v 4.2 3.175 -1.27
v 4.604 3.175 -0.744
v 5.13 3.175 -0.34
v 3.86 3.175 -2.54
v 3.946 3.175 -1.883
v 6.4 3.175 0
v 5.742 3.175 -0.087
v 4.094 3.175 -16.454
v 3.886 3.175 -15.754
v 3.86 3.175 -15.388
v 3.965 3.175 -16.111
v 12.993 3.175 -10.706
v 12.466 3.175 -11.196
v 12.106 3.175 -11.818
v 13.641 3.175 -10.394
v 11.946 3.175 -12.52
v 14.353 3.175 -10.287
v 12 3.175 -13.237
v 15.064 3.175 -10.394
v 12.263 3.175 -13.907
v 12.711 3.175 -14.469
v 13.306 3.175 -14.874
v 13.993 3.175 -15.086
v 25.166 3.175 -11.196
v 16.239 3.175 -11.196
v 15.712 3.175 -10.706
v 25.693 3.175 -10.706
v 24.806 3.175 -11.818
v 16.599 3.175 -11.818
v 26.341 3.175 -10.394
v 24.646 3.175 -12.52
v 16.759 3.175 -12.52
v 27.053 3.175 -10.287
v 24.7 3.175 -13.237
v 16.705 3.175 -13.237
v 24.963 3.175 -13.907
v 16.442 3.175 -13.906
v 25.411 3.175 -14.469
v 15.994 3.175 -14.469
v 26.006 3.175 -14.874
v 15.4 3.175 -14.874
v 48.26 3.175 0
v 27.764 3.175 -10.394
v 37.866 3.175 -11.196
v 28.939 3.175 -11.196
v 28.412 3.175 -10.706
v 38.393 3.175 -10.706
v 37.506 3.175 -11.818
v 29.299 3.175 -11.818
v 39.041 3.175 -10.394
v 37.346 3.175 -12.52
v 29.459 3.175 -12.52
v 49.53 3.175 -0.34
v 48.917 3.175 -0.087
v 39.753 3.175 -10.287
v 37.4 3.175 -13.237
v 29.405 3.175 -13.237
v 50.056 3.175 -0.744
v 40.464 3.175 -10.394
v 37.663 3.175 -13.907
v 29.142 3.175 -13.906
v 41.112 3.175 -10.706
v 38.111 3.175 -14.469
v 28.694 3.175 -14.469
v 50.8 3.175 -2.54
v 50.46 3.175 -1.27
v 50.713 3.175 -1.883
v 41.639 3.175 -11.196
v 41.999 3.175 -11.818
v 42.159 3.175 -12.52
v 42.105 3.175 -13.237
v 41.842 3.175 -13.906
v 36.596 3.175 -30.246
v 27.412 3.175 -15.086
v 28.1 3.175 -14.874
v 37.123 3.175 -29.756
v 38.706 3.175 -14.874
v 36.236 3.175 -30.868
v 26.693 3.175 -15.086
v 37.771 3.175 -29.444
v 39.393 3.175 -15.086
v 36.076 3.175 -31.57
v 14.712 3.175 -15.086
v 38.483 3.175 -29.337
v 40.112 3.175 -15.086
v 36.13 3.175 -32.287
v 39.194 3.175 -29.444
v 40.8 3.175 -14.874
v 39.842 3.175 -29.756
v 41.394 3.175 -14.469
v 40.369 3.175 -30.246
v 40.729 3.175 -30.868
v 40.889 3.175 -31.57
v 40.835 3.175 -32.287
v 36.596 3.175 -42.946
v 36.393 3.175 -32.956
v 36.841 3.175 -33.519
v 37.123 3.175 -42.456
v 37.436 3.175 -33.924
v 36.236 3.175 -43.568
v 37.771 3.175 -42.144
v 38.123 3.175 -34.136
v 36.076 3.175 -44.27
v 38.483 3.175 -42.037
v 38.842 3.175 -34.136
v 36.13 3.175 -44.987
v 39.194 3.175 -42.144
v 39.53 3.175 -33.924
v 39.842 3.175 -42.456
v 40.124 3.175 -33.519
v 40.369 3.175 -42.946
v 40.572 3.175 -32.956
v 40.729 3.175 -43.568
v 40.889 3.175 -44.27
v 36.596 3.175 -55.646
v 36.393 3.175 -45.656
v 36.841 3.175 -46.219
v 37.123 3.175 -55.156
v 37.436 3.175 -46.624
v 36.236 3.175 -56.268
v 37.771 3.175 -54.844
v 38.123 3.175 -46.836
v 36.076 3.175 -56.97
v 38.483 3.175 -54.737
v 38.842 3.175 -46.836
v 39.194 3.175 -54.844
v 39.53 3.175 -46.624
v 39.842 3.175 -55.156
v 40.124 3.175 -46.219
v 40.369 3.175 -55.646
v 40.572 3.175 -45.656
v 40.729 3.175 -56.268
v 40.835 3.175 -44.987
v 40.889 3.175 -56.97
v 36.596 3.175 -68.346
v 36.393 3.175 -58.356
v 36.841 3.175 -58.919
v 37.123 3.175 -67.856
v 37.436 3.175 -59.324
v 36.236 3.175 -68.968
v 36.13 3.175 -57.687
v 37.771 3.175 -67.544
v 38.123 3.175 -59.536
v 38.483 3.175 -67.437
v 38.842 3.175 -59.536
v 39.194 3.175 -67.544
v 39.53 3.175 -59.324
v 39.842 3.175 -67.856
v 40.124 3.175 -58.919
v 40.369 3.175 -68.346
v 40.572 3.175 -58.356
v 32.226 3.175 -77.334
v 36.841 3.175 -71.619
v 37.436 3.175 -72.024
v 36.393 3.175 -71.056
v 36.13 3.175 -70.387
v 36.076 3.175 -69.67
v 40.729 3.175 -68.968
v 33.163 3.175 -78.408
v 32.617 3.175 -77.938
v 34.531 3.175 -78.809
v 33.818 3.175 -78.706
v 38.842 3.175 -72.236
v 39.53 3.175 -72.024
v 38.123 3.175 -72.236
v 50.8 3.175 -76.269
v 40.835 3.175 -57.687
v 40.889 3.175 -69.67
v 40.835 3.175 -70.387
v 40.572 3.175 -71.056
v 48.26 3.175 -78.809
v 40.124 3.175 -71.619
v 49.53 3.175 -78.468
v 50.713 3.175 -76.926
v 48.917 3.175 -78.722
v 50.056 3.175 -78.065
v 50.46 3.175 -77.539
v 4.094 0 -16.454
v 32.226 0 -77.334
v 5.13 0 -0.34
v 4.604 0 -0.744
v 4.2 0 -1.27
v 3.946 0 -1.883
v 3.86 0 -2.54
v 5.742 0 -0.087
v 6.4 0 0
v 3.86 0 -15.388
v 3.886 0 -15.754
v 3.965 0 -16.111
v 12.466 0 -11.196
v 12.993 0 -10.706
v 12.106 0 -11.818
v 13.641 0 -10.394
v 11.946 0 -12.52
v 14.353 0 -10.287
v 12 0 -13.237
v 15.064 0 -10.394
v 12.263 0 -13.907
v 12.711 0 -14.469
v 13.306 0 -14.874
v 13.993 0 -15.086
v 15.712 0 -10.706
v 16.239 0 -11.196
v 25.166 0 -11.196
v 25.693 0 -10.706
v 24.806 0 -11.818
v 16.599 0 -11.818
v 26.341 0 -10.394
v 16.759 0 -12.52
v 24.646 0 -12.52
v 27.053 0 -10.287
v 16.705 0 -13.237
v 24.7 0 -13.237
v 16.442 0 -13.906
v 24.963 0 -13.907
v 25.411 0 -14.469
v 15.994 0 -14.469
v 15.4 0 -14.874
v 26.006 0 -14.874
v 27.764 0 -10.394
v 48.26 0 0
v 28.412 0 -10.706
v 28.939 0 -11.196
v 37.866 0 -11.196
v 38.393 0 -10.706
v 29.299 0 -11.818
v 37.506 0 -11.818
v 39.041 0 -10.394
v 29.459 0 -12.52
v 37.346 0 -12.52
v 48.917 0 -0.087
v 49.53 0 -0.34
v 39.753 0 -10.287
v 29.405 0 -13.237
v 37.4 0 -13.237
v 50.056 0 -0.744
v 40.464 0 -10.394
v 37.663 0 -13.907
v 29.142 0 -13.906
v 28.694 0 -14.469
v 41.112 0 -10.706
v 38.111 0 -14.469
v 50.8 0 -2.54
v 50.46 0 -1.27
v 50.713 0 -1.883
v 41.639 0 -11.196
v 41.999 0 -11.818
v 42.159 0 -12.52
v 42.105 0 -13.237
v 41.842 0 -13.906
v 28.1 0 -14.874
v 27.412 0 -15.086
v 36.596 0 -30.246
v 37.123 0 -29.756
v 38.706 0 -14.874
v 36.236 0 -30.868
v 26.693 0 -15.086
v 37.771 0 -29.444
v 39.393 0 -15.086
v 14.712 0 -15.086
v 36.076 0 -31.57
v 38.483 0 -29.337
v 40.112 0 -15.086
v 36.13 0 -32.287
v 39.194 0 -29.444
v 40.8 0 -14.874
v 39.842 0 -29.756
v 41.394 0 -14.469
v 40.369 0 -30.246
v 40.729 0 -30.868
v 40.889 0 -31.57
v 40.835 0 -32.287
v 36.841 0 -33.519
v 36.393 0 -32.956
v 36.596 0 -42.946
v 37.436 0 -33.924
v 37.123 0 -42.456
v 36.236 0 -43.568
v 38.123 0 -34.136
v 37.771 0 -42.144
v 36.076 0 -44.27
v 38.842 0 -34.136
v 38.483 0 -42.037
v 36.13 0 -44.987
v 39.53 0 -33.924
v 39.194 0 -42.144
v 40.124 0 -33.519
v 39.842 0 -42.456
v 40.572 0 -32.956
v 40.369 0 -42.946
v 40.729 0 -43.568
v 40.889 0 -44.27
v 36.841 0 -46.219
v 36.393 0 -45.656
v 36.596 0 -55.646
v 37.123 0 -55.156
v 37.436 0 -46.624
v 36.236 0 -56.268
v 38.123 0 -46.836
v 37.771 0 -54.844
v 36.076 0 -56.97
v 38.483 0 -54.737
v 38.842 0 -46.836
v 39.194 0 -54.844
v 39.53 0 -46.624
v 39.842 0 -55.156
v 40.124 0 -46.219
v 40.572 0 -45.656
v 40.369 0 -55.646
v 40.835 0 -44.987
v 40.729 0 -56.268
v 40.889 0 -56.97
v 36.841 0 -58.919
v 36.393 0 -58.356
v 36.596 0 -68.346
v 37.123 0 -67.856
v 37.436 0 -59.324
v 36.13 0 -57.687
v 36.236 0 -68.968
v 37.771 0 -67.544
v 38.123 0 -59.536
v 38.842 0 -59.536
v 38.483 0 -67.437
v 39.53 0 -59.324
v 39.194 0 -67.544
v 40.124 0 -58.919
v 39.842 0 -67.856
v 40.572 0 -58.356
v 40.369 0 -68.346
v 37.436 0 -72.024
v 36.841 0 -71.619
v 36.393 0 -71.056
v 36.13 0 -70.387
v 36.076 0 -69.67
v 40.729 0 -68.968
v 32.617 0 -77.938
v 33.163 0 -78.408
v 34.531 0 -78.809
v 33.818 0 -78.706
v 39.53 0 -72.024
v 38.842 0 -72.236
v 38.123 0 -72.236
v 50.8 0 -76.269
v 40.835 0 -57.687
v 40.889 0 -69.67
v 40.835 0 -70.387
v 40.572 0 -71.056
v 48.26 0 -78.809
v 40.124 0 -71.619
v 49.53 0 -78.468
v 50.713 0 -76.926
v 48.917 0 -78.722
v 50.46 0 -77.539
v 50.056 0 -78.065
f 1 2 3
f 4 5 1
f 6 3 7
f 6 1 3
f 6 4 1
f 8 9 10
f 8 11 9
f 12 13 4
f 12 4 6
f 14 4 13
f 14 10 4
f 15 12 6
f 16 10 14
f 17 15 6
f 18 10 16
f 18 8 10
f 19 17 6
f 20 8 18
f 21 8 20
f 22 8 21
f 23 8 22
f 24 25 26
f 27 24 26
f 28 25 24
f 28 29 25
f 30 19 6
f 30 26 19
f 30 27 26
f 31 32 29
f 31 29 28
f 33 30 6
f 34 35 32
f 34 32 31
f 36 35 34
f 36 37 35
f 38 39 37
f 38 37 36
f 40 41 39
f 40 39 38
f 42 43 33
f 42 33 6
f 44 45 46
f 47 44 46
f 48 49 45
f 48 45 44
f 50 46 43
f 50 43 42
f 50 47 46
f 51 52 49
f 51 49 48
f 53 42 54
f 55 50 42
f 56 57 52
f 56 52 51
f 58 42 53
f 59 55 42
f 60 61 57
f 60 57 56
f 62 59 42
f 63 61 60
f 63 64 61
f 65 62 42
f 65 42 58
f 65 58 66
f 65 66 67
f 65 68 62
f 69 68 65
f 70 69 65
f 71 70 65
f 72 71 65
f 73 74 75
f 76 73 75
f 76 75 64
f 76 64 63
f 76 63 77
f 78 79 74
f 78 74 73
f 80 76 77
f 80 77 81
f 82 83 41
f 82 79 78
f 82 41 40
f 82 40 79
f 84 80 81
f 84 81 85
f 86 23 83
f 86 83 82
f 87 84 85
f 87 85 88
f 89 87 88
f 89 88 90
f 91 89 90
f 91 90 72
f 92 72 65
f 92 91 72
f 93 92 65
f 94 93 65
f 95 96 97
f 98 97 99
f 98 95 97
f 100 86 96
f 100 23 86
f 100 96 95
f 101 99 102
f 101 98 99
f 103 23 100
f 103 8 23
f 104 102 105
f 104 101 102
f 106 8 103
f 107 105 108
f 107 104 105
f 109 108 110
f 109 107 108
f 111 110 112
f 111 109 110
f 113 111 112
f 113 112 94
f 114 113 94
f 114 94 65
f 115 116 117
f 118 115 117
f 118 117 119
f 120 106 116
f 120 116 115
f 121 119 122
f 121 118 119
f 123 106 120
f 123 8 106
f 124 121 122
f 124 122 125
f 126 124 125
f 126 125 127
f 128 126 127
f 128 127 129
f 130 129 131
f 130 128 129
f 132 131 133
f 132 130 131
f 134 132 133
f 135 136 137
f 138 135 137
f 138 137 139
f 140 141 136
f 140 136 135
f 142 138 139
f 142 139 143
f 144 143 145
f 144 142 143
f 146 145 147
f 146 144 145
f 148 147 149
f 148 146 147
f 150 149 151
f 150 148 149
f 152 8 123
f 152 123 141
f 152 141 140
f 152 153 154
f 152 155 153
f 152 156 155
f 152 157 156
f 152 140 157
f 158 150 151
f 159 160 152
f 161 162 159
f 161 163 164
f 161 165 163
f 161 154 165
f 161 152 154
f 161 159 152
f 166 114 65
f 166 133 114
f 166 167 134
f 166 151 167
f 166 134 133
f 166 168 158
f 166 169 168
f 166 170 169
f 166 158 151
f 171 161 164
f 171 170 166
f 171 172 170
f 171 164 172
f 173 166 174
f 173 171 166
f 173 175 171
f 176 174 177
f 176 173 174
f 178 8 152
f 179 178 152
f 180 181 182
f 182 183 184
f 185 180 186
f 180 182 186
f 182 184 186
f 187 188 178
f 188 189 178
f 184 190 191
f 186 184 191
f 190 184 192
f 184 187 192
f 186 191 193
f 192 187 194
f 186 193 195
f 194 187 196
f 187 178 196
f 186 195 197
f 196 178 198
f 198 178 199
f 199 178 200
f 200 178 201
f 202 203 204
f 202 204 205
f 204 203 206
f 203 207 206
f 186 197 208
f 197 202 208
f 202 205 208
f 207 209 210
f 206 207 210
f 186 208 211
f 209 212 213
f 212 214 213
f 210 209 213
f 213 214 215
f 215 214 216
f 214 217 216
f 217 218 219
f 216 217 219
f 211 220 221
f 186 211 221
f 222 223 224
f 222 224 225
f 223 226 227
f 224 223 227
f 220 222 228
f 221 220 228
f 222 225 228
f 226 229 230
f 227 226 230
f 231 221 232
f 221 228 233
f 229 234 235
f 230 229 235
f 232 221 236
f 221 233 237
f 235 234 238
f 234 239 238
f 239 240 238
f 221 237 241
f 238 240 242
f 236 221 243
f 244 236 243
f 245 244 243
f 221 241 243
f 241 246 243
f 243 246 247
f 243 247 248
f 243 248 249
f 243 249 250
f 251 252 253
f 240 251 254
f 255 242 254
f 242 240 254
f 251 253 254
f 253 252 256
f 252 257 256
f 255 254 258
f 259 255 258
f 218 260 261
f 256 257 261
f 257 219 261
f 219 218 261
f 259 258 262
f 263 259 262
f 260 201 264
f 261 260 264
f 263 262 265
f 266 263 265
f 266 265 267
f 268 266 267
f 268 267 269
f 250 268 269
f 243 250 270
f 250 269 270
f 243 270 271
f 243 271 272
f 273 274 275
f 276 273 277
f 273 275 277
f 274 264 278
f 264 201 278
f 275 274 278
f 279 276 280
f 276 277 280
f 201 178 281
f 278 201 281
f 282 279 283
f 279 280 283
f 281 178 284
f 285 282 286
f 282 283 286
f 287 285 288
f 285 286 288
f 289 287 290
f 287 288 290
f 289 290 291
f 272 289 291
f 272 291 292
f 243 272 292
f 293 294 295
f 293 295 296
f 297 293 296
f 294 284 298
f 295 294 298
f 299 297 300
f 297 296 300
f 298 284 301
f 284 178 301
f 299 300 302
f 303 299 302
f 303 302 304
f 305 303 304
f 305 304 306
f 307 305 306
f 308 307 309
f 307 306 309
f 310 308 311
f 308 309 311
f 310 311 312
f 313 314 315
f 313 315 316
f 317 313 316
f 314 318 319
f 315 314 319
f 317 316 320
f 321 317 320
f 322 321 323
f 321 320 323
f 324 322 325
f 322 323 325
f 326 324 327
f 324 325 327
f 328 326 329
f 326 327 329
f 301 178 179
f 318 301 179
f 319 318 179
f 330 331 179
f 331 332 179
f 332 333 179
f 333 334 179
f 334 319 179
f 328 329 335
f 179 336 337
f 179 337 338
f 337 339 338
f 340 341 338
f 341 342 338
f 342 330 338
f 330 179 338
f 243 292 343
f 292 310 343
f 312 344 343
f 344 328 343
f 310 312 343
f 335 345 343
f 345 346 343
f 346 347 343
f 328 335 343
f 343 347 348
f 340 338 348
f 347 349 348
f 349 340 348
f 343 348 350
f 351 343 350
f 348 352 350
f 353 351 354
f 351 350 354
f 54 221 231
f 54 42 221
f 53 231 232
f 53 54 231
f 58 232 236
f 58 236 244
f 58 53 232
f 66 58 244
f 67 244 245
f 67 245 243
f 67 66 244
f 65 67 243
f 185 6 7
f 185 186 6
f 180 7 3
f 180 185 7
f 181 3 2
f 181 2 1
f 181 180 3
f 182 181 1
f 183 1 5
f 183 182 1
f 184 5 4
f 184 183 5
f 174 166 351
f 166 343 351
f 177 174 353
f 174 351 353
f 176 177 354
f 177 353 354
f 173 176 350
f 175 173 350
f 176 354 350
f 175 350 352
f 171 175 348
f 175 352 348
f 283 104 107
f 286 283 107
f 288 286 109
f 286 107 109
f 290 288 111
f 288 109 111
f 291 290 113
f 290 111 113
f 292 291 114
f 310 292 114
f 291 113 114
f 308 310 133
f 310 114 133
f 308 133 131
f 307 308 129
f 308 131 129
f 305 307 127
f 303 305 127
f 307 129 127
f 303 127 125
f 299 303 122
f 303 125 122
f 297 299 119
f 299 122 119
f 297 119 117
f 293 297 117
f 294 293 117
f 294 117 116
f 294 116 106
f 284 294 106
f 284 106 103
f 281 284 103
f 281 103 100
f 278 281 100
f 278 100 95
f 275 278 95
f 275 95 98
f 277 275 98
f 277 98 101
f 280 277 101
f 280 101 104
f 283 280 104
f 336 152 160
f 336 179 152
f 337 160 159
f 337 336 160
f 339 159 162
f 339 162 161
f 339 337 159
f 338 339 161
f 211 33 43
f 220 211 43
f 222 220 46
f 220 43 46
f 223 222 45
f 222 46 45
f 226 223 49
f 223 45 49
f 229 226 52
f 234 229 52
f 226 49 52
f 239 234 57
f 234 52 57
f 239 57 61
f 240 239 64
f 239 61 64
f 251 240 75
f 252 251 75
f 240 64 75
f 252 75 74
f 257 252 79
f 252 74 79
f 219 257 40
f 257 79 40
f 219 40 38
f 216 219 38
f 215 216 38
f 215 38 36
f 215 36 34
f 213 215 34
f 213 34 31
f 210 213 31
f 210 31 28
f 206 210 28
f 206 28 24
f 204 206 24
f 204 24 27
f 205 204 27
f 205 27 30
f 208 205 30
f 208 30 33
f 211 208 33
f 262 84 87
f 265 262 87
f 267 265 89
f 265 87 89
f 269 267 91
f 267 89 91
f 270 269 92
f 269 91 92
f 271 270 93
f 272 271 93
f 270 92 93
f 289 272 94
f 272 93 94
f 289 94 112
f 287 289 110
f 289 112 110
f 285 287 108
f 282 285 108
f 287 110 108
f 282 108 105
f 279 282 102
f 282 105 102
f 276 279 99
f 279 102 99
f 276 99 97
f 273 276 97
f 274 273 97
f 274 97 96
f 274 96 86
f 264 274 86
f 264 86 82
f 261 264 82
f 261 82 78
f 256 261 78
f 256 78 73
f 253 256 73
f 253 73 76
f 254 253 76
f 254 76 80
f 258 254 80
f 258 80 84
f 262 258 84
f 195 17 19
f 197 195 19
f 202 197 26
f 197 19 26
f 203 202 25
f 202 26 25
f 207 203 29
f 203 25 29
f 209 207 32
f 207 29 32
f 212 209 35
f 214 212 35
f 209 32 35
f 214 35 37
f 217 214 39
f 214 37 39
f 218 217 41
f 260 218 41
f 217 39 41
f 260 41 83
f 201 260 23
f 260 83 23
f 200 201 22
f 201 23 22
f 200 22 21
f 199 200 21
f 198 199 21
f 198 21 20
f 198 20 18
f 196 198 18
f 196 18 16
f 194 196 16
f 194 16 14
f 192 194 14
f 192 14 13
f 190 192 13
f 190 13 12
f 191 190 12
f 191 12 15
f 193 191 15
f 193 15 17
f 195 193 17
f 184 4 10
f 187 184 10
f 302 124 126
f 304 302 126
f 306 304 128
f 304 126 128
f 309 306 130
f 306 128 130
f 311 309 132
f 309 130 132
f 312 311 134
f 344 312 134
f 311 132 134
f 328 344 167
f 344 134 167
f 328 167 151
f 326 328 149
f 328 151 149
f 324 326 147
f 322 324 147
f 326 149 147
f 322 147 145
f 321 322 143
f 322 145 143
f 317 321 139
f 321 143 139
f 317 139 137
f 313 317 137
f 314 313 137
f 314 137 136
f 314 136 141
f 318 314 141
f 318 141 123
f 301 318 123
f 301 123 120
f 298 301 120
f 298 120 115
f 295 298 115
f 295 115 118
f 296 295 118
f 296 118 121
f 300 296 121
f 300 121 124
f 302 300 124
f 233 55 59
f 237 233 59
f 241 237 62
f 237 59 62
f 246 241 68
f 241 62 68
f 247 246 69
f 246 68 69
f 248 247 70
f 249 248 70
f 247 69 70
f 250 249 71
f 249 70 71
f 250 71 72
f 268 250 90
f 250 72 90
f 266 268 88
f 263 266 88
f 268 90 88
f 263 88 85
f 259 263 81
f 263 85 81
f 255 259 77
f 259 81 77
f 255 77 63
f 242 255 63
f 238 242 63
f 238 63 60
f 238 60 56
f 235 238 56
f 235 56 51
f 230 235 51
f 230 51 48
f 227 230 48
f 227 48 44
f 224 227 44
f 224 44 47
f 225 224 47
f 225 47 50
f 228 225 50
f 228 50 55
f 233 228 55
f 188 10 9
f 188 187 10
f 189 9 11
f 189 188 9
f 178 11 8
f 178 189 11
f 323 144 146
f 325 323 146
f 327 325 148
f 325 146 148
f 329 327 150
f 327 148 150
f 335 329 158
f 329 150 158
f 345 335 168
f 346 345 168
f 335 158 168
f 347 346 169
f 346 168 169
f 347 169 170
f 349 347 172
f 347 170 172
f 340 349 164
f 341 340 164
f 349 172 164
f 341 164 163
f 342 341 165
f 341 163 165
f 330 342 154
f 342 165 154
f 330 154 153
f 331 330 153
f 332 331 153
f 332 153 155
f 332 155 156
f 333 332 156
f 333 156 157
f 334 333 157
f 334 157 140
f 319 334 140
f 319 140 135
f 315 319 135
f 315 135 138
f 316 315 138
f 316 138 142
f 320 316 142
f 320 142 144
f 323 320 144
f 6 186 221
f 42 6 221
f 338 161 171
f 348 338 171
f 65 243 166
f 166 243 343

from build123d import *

# Parameters (mm, degrees)
SKETCH1_W           = 50.8
SKETCH1_H           = 82.55
BOSS_EXTRUDE1_DEPTH = 3.175
SKETCH2_R           = 2.413
CUT_EXTRUDE1_DEPTH  = 97.980529618
CUT_EXTRUDE2_DEPTH  = 97.980529618
FILLET1_R           = 2.54


with BuildPart() as part:
    # Sketch1 → Boss-Extrude1 (new body)
    with BuildSketch(Plane(origin=(0, 0, 0), x_dir=(1, 0, 0), z_dir=(0, 1, 0))):
        with Locations((25.4, 41.275)):
            Rectangle(SKETCH1_W, SKETCH1_H)
    extrude(amount=BOSS_EXTRUDE1_DEPTH)

    # Sketch2 → Cut-Extrude1 (cut, through all)
    with BuildSketch(Plane(origin=(0, 3.175, 0), x_dir=(1, 0, 0), z_dir=(0, 1, 0))):
        with Locations(Location((39.752682174, 12.7, 0), (0, 0, 270))):
            Circle(SKETCH2_R)
        with Locations(Location((27.052682174, 12.7, 0), (0, 0, 270))):
            Circle(SKETCH2_R)
        with Locations(Location((14.352682174, 12.7, 0), (0, 0, 270))):
            Circle(SKETCH2_R)
        with Locations(Location((38.482682174, 31.75, 0), (0, 0, 270))):
            Circle(SKETCH2_R)
        with Locations(Location((38.482682174, 44.45, 0), (0, 0, 270))):
            Circle(SKETCH2_R)
        with Locations(Location((38.482682174, 57.15, 0), (0, 0, 270))):
            Circle(SKETCH2_R)
        with Locations(Location((38.482682174, 69.85, 0), (0, 0, 270))):
            Circle(SKETCH2_R)
    extrude(amount=-CUT_EXTRUDE1_DEPTH, mode=Mode.SUBTRACT)

    # Sketch3 → Cut-Extrude2 (cut, through all)
    with BuildSketch(Plane(origin=(0, 3.175, 0), x_dir=(1, 0, 0), z_dir=(0, 1, 0))):
        Polygon((3.859765226, 0), (3.859765226, 15.946793053), (32.906889952, 78.808591348), (50.8, 78.808591348), (50.8, 82.55), (0, 82.55), (0, 0), align=None)
    extrude(amount=-CUT_EXTRUDE2_DEPTH, mode=Mode.SUBTRACT)

    # Fillet1
    fillet1_edges = [part.edges().sort_by_distance(p)[0] for p in [
        (3.859765226, 1.5875, 0),
        (50.8, 1.5875, -78.808591348),
        (32.906889952, 1.5875, -78.808591348),
        (3.859765226, 1.5875, -15.946793053),
        (50.8, 1.5875, 0),
    ]]
    fillet(fillet1_edges, radius=FILLET1_R)


solid = part.part
